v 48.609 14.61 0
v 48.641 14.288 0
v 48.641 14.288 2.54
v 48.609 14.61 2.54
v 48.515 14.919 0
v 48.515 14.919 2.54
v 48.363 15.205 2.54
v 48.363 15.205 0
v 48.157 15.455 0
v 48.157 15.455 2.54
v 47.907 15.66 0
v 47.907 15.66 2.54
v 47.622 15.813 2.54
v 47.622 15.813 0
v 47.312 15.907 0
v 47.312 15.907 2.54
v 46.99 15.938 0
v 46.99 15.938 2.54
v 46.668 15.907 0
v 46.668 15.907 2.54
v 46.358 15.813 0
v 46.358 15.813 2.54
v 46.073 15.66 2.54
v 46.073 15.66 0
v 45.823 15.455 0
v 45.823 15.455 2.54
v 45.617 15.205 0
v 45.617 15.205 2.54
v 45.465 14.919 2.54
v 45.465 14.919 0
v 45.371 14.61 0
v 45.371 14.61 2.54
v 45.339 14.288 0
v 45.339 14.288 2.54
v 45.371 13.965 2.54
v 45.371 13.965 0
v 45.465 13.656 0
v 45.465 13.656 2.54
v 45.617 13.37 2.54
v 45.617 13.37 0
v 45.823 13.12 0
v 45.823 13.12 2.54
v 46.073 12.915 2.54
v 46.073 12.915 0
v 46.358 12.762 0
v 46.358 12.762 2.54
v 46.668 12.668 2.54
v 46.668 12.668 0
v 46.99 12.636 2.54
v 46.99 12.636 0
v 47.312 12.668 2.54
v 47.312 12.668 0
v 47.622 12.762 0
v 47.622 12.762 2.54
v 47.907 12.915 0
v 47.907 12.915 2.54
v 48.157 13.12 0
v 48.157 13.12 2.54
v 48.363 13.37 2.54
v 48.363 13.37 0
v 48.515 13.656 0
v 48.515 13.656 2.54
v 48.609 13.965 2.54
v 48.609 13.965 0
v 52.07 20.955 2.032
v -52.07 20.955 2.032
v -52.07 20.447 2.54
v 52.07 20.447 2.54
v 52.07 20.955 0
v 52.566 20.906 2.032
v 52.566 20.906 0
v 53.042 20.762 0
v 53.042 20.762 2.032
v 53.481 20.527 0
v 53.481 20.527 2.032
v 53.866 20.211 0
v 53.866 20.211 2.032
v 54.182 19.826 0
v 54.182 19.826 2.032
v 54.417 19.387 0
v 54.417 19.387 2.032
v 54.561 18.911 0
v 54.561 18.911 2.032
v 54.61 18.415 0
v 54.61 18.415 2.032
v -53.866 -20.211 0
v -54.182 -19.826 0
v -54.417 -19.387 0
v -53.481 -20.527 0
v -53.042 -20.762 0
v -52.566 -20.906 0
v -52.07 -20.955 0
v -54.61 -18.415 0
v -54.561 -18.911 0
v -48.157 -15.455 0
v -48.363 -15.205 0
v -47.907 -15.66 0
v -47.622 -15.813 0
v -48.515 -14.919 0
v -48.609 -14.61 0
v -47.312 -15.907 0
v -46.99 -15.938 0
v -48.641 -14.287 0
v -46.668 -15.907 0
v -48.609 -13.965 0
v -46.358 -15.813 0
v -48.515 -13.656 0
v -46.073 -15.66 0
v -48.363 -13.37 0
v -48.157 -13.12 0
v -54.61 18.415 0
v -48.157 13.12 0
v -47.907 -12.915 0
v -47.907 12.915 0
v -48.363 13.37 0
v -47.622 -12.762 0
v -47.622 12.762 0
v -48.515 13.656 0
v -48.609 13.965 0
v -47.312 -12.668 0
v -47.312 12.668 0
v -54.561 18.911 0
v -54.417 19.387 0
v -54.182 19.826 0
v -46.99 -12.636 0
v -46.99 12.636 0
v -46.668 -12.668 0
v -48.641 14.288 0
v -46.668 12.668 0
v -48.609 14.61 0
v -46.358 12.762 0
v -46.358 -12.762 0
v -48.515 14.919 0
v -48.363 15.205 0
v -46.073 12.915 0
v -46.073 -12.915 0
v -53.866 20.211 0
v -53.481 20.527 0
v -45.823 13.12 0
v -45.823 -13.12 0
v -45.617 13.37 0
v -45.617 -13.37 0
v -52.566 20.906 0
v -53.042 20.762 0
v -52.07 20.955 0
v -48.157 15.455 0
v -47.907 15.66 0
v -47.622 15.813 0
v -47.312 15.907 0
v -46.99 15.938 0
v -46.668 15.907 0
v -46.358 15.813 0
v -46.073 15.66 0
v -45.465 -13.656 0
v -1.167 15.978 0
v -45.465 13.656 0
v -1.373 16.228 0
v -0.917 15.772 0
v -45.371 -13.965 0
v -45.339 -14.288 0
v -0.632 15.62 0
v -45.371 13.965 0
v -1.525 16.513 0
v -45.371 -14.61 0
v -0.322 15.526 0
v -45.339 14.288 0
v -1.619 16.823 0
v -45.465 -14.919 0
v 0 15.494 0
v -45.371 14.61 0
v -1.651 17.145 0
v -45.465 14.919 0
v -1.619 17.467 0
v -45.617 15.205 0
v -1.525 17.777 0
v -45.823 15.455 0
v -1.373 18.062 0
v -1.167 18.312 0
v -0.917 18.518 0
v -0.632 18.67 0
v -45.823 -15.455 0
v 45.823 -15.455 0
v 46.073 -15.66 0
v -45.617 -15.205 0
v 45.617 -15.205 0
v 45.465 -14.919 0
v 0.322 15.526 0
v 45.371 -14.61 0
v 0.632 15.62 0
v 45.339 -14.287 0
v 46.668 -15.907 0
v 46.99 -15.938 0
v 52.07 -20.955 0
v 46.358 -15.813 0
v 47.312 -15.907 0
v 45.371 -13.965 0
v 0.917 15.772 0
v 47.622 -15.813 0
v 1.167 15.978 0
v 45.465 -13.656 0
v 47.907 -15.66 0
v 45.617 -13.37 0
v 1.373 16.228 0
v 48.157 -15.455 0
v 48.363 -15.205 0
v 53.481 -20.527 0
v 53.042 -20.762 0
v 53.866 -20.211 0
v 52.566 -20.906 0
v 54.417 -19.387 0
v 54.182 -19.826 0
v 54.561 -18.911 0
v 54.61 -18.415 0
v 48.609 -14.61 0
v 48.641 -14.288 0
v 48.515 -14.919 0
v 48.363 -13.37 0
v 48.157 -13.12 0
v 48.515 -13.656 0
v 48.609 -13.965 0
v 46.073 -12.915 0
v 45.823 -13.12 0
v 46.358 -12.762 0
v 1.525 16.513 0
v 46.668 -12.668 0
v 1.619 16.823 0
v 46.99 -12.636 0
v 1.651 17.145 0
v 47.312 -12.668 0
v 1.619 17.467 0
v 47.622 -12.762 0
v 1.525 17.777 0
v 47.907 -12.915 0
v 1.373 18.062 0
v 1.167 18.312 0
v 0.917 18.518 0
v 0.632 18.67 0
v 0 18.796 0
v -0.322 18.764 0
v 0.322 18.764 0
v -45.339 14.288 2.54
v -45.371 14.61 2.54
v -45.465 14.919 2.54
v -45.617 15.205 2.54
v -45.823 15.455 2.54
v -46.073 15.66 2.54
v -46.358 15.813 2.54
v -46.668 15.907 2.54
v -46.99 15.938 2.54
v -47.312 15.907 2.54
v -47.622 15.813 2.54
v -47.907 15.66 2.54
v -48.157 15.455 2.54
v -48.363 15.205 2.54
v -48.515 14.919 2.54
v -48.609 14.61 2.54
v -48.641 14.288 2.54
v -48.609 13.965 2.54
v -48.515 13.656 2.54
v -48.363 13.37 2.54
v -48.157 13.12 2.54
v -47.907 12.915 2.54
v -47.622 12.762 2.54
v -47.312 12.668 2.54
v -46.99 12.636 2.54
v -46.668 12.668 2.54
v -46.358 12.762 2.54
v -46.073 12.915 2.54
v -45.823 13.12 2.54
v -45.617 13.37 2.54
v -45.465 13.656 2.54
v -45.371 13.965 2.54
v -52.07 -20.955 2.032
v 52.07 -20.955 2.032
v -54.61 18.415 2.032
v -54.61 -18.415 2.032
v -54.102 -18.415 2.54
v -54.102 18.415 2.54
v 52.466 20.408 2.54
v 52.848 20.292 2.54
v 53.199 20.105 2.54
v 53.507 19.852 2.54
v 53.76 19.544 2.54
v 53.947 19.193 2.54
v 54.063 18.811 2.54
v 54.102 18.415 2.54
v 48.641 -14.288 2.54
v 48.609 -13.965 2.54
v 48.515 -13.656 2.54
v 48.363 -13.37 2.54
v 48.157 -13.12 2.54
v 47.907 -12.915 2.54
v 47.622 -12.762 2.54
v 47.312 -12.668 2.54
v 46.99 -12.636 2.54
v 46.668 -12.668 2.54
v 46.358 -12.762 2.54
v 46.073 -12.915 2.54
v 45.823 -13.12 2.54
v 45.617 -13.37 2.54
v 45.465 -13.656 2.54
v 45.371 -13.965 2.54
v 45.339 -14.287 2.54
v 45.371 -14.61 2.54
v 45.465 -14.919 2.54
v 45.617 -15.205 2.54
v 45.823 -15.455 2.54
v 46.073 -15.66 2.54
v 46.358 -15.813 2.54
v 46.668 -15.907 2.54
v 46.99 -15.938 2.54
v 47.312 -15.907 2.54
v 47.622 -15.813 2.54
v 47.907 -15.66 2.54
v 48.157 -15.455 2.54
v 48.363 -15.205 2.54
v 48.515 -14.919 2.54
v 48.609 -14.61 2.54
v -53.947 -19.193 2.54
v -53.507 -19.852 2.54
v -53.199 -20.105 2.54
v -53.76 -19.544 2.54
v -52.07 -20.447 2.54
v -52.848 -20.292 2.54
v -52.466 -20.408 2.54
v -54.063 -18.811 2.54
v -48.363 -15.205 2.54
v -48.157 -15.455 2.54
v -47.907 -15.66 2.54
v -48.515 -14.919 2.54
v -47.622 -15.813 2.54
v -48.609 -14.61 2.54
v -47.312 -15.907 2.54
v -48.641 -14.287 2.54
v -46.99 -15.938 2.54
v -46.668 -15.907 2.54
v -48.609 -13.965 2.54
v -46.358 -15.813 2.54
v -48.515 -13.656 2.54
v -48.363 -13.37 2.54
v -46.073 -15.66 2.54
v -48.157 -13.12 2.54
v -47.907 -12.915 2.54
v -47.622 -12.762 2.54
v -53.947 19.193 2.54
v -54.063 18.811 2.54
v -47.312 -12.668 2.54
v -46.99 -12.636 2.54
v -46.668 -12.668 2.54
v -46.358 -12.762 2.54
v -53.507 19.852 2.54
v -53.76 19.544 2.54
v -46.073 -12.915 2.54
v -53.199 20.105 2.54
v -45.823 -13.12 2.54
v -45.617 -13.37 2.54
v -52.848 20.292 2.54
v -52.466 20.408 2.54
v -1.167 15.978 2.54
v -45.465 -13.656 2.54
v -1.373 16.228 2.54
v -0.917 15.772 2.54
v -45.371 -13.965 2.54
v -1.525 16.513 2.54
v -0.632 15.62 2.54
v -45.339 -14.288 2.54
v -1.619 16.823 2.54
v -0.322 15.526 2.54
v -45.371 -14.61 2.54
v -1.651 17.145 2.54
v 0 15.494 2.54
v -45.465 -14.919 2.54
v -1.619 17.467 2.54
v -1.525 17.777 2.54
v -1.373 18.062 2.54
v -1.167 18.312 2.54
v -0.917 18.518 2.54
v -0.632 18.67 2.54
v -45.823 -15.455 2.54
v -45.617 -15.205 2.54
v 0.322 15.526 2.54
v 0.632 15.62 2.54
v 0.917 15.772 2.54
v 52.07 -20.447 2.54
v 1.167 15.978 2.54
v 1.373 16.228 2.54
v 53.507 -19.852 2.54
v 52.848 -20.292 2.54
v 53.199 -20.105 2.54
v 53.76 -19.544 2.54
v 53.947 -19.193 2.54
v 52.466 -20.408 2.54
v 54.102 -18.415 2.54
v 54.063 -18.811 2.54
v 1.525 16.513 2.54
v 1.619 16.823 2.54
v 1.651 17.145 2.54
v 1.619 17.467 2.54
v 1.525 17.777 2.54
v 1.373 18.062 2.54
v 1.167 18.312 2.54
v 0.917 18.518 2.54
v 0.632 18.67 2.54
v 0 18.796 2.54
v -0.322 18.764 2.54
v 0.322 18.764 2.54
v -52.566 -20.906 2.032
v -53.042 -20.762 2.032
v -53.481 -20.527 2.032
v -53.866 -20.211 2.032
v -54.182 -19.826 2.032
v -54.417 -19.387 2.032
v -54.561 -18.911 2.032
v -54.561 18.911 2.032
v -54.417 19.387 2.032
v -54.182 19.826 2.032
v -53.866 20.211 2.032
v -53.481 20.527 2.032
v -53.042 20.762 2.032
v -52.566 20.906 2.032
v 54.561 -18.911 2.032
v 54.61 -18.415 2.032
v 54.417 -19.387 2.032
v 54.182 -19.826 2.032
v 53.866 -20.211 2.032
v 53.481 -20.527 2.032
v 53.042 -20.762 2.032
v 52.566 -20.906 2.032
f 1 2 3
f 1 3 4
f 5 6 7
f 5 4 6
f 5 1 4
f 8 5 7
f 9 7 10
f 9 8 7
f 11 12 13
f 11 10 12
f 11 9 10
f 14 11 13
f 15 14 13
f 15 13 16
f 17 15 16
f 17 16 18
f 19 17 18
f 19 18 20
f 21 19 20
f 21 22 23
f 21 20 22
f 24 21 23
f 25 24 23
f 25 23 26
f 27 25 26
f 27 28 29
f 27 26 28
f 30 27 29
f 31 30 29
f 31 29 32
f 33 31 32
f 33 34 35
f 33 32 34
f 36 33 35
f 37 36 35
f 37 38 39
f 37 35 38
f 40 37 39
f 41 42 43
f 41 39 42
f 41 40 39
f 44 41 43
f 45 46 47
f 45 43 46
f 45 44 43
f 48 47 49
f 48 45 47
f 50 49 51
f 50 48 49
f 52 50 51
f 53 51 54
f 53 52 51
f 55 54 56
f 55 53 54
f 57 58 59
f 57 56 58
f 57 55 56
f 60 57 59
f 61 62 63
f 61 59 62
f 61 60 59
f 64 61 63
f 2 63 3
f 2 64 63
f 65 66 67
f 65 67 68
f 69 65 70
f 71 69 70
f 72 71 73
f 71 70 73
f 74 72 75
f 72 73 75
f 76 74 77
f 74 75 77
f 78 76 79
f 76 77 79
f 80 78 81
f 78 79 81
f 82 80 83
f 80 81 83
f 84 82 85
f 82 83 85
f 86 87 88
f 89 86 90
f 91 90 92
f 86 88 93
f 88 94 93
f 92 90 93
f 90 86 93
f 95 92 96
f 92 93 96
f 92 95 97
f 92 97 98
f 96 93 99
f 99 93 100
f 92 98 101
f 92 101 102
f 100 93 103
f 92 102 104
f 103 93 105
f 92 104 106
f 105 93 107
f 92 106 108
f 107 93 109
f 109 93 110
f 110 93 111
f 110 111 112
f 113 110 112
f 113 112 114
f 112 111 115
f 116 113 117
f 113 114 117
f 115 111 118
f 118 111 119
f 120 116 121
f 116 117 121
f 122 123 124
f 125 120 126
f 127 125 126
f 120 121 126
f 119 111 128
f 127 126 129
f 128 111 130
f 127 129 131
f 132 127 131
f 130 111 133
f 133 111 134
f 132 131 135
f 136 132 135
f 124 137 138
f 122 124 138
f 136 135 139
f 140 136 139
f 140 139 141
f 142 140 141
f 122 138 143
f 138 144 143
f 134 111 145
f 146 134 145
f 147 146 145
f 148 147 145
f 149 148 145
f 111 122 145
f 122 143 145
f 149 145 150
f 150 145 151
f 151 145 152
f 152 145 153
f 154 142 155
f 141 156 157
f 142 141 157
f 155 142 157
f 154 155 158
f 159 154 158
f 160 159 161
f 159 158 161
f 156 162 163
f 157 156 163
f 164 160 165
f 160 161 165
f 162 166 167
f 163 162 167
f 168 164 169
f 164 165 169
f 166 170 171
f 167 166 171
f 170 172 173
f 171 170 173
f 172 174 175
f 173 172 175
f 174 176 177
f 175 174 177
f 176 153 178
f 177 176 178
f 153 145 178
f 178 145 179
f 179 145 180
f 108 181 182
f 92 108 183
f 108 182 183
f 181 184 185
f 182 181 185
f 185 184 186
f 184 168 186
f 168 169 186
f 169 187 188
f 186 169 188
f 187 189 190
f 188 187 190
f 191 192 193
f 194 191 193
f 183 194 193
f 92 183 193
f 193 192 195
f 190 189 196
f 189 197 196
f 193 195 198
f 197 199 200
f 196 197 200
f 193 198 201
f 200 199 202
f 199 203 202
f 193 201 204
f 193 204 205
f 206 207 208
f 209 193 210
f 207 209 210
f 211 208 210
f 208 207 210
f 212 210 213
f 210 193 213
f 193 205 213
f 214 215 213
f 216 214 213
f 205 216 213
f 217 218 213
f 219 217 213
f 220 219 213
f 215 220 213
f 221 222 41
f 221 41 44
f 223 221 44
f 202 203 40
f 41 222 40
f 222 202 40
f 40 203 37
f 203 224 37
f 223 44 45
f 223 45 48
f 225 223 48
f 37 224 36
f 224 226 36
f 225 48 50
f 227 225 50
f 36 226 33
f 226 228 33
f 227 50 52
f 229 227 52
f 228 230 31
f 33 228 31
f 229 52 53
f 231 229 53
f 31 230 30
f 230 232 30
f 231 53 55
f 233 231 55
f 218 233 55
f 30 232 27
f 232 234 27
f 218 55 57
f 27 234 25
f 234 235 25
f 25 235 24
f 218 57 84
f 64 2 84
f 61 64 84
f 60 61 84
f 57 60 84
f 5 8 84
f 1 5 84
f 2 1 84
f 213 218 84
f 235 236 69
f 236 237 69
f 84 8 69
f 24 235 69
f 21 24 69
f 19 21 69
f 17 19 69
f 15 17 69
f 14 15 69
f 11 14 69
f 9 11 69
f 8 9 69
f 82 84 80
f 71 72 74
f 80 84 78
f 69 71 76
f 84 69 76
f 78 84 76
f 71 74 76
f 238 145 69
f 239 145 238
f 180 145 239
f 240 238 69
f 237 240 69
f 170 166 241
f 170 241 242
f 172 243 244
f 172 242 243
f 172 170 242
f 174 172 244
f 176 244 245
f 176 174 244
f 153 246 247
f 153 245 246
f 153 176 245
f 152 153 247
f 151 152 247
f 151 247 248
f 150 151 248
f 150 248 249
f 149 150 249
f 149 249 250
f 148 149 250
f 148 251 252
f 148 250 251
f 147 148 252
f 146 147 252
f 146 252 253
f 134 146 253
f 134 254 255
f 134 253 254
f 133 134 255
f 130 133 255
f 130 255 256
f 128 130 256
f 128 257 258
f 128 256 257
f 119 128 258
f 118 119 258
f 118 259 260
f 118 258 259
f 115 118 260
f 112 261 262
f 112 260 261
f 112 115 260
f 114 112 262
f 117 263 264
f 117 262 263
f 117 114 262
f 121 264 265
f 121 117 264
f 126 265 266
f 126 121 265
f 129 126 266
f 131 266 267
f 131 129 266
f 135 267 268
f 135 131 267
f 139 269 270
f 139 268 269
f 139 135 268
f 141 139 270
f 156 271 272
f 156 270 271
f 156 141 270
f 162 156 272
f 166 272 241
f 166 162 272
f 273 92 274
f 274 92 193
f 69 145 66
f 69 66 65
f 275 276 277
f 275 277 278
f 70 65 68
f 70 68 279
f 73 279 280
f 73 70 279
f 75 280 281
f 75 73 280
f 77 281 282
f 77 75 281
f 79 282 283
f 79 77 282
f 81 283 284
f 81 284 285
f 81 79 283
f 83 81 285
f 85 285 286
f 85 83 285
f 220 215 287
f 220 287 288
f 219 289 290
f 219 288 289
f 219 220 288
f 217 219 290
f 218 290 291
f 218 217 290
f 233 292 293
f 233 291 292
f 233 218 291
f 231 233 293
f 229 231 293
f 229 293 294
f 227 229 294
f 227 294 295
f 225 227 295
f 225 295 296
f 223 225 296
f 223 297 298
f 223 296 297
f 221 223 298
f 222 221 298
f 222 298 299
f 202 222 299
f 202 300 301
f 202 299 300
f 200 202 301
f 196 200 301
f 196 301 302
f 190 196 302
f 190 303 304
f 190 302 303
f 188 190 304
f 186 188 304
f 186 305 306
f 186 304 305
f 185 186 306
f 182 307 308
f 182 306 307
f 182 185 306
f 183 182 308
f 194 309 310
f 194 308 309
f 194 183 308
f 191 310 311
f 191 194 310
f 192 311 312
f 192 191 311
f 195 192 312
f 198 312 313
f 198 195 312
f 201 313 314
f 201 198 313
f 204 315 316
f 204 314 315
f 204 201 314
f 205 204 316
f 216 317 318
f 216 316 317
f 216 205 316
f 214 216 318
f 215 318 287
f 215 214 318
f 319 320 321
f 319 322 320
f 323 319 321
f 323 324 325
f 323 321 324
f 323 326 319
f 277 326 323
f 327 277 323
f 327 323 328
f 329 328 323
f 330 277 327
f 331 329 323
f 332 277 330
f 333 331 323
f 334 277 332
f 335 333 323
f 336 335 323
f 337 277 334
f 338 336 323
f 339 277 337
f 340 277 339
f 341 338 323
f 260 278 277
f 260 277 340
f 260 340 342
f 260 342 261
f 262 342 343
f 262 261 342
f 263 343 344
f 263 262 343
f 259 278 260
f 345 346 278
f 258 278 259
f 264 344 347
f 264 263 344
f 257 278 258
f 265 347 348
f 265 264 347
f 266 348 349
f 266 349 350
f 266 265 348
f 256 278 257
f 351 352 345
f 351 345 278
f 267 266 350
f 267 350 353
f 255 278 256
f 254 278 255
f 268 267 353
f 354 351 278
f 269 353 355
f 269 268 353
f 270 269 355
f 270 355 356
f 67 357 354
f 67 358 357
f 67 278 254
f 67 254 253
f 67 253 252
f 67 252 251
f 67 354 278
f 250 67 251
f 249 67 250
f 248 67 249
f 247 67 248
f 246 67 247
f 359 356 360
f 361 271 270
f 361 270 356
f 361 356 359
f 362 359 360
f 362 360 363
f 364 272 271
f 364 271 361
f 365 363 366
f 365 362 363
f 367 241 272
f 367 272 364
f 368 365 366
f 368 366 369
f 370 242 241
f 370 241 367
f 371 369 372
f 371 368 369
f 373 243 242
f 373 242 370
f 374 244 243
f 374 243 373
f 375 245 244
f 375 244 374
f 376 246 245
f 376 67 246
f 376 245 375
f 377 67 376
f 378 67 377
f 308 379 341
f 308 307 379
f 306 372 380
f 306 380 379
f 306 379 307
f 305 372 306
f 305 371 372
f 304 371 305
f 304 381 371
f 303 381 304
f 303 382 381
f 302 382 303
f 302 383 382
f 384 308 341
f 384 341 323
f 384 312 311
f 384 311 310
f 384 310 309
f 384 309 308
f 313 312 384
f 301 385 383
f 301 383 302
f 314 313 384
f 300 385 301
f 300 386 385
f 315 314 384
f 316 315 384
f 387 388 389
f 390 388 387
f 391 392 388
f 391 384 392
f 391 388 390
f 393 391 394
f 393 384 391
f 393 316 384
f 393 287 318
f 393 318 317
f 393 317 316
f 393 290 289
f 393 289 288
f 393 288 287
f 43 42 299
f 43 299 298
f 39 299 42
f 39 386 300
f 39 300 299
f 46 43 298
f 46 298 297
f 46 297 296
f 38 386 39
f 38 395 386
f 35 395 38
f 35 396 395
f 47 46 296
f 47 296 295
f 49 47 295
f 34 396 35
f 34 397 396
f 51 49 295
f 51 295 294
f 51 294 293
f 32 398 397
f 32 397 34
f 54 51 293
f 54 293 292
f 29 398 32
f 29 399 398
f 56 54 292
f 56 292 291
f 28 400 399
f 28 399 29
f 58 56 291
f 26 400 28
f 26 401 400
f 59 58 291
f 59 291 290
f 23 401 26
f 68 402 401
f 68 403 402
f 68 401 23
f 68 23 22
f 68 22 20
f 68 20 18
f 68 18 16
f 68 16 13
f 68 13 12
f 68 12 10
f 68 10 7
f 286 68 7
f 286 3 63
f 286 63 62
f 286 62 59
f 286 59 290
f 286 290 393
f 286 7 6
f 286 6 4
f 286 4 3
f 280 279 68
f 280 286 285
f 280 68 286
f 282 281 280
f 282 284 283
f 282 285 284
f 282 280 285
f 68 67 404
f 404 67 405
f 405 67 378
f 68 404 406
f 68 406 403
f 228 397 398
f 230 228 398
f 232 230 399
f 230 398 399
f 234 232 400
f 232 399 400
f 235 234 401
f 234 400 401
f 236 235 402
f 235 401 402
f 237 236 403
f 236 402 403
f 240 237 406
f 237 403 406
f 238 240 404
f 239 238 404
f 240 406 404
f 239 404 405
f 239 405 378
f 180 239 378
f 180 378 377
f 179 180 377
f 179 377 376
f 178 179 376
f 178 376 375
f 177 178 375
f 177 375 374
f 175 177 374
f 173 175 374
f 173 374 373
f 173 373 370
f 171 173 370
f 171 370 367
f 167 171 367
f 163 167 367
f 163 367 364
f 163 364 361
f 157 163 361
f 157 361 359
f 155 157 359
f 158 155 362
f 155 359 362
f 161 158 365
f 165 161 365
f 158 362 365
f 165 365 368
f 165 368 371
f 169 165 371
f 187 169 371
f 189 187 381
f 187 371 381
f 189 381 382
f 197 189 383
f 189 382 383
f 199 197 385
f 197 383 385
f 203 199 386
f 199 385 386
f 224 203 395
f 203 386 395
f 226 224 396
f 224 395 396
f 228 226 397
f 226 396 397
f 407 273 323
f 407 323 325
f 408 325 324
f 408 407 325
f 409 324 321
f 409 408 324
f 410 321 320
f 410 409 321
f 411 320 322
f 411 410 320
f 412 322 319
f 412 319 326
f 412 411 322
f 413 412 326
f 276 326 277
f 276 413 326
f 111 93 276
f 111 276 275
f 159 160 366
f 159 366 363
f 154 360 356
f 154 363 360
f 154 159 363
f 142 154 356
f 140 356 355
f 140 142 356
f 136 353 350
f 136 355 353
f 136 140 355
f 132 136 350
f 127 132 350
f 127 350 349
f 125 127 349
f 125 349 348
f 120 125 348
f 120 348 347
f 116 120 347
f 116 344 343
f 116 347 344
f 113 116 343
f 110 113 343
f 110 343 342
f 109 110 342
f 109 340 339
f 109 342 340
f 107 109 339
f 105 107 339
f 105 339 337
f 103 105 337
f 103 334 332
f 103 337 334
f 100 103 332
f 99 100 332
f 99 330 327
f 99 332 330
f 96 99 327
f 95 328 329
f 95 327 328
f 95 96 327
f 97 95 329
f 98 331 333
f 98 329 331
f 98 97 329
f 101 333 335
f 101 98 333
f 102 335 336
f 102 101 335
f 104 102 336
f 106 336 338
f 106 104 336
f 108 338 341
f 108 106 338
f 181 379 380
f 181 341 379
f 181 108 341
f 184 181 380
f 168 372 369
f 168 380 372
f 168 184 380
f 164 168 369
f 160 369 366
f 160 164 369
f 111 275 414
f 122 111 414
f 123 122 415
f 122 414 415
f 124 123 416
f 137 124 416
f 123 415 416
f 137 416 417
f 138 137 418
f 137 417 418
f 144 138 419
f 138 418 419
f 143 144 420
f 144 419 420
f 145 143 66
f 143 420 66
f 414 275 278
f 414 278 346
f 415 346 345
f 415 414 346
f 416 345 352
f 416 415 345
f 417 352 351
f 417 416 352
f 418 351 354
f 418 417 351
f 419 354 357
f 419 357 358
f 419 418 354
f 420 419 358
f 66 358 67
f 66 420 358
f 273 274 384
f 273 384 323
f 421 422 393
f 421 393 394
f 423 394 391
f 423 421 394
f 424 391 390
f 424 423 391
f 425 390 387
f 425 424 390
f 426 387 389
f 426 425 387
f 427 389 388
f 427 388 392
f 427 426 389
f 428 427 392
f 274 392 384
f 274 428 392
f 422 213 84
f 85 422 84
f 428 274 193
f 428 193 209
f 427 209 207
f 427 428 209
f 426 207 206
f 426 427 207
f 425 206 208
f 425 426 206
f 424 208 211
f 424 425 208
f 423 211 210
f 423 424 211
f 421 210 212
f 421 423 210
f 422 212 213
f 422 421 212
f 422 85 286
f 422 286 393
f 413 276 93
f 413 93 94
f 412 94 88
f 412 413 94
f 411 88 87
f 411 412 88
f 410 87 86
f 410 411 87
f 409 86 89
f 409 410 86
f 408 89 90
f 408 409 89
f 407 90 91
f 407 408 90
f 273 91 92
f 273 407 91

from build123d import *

# Parameters (mm, degrees)
SKETCH1_W               = 109.22
SKETCH1_H               = 41.91
BOSS_EXTRUDE1_DEPTH     = 2.54
CUT_EXTRUDE2_DEPTH      = 59.547550974
CUT_EXTRUDE2_DEPTH_BACK = 59.547550974
SKETCH4_R               = 1.651
FILLET1_R               = 2.54
SKETCH14_R              = 1.651
CUT_EXTRUDE8_DEPTH      = 59.547550974
CHAMFER2_SIZE           = 0.508


with BuildPart() as part:
    # Sketch1 → Boss-Extrude1 (new body)
    with BuildSketch(Plane.XY):
        Rectangle(SKETCH1_W, SKETCH1_H)
    extrude(amount=BOSS_EXTRUDE1_DEPTH)

    # Sketch4 → Cut-Extrude2 (cut, two sides: drawn at the far end of the back side and taken through both)
    with BuildSketch(Plane.XY.offset(2.54).offset(-CUT_EXTRUDE2_DEPTH_BACK)):
        with Locations((-46.99, 14.2875)):
            Circle(SKETCH4_R)
        with Locations((-46.99, -14.2875)):
            Circle(SKETCH4_R)
        with Locations((46.99, -14.2875)):
            Circle(SKETCH4_R)
        with Locations((46.99, 14.2875)):
            Circle(SKETCH4_R)
    extrude(amount=CUT_EXTRUDE2_DEPTH + CUT_EXTRUDE2_DEPTH_BACK, mode=Mode.SUBTRACT)

    # Fillet1
    fillet1_edges = [part.edges().sort_by_distance(p)[0] for p in [
        (-54.61, 20.955, 1.27),
        (54.61, 20.955, 1.27),
        (54.61, -20.955, 1.27),
        (-54.61, -20.955, 1.27),
    ]]
    fillet(fillet1_edges, radius=FILLET1_R)

    # Sketch14 → Cut-Extrude8 (cut, through all)
    with BuildSketch(Plane.XY.offset(2.54)):
        with Locations((0, 17.145)):
            Circle(SKETCH14_R)
    extrude(amount=-CUT_EXTRUDE8_DEPTH, mode=Mode.SUBTRACT)

    # Chamfer2
    chamfer2_edges = [part.edges().sort_by_distance(p)[0] for p in [
        (0, 20.955, 2.54),
        (54.61, 0, 2.54),
        (-54.61, 0, 2.54),
        (0, -20.955, 2.54),
        (-53.866051224, 20.211051224, 2.54),
        (-53.866051224, -20.211051224, 2.54),
        (53.866051224, -20.211051224, 2.54),
        (53.866051224, 20.211051224, 2.54),
    ]]
    chamfer(chamfer2_edges, length=CHAMFER2_SIZE)


solid = part.part
